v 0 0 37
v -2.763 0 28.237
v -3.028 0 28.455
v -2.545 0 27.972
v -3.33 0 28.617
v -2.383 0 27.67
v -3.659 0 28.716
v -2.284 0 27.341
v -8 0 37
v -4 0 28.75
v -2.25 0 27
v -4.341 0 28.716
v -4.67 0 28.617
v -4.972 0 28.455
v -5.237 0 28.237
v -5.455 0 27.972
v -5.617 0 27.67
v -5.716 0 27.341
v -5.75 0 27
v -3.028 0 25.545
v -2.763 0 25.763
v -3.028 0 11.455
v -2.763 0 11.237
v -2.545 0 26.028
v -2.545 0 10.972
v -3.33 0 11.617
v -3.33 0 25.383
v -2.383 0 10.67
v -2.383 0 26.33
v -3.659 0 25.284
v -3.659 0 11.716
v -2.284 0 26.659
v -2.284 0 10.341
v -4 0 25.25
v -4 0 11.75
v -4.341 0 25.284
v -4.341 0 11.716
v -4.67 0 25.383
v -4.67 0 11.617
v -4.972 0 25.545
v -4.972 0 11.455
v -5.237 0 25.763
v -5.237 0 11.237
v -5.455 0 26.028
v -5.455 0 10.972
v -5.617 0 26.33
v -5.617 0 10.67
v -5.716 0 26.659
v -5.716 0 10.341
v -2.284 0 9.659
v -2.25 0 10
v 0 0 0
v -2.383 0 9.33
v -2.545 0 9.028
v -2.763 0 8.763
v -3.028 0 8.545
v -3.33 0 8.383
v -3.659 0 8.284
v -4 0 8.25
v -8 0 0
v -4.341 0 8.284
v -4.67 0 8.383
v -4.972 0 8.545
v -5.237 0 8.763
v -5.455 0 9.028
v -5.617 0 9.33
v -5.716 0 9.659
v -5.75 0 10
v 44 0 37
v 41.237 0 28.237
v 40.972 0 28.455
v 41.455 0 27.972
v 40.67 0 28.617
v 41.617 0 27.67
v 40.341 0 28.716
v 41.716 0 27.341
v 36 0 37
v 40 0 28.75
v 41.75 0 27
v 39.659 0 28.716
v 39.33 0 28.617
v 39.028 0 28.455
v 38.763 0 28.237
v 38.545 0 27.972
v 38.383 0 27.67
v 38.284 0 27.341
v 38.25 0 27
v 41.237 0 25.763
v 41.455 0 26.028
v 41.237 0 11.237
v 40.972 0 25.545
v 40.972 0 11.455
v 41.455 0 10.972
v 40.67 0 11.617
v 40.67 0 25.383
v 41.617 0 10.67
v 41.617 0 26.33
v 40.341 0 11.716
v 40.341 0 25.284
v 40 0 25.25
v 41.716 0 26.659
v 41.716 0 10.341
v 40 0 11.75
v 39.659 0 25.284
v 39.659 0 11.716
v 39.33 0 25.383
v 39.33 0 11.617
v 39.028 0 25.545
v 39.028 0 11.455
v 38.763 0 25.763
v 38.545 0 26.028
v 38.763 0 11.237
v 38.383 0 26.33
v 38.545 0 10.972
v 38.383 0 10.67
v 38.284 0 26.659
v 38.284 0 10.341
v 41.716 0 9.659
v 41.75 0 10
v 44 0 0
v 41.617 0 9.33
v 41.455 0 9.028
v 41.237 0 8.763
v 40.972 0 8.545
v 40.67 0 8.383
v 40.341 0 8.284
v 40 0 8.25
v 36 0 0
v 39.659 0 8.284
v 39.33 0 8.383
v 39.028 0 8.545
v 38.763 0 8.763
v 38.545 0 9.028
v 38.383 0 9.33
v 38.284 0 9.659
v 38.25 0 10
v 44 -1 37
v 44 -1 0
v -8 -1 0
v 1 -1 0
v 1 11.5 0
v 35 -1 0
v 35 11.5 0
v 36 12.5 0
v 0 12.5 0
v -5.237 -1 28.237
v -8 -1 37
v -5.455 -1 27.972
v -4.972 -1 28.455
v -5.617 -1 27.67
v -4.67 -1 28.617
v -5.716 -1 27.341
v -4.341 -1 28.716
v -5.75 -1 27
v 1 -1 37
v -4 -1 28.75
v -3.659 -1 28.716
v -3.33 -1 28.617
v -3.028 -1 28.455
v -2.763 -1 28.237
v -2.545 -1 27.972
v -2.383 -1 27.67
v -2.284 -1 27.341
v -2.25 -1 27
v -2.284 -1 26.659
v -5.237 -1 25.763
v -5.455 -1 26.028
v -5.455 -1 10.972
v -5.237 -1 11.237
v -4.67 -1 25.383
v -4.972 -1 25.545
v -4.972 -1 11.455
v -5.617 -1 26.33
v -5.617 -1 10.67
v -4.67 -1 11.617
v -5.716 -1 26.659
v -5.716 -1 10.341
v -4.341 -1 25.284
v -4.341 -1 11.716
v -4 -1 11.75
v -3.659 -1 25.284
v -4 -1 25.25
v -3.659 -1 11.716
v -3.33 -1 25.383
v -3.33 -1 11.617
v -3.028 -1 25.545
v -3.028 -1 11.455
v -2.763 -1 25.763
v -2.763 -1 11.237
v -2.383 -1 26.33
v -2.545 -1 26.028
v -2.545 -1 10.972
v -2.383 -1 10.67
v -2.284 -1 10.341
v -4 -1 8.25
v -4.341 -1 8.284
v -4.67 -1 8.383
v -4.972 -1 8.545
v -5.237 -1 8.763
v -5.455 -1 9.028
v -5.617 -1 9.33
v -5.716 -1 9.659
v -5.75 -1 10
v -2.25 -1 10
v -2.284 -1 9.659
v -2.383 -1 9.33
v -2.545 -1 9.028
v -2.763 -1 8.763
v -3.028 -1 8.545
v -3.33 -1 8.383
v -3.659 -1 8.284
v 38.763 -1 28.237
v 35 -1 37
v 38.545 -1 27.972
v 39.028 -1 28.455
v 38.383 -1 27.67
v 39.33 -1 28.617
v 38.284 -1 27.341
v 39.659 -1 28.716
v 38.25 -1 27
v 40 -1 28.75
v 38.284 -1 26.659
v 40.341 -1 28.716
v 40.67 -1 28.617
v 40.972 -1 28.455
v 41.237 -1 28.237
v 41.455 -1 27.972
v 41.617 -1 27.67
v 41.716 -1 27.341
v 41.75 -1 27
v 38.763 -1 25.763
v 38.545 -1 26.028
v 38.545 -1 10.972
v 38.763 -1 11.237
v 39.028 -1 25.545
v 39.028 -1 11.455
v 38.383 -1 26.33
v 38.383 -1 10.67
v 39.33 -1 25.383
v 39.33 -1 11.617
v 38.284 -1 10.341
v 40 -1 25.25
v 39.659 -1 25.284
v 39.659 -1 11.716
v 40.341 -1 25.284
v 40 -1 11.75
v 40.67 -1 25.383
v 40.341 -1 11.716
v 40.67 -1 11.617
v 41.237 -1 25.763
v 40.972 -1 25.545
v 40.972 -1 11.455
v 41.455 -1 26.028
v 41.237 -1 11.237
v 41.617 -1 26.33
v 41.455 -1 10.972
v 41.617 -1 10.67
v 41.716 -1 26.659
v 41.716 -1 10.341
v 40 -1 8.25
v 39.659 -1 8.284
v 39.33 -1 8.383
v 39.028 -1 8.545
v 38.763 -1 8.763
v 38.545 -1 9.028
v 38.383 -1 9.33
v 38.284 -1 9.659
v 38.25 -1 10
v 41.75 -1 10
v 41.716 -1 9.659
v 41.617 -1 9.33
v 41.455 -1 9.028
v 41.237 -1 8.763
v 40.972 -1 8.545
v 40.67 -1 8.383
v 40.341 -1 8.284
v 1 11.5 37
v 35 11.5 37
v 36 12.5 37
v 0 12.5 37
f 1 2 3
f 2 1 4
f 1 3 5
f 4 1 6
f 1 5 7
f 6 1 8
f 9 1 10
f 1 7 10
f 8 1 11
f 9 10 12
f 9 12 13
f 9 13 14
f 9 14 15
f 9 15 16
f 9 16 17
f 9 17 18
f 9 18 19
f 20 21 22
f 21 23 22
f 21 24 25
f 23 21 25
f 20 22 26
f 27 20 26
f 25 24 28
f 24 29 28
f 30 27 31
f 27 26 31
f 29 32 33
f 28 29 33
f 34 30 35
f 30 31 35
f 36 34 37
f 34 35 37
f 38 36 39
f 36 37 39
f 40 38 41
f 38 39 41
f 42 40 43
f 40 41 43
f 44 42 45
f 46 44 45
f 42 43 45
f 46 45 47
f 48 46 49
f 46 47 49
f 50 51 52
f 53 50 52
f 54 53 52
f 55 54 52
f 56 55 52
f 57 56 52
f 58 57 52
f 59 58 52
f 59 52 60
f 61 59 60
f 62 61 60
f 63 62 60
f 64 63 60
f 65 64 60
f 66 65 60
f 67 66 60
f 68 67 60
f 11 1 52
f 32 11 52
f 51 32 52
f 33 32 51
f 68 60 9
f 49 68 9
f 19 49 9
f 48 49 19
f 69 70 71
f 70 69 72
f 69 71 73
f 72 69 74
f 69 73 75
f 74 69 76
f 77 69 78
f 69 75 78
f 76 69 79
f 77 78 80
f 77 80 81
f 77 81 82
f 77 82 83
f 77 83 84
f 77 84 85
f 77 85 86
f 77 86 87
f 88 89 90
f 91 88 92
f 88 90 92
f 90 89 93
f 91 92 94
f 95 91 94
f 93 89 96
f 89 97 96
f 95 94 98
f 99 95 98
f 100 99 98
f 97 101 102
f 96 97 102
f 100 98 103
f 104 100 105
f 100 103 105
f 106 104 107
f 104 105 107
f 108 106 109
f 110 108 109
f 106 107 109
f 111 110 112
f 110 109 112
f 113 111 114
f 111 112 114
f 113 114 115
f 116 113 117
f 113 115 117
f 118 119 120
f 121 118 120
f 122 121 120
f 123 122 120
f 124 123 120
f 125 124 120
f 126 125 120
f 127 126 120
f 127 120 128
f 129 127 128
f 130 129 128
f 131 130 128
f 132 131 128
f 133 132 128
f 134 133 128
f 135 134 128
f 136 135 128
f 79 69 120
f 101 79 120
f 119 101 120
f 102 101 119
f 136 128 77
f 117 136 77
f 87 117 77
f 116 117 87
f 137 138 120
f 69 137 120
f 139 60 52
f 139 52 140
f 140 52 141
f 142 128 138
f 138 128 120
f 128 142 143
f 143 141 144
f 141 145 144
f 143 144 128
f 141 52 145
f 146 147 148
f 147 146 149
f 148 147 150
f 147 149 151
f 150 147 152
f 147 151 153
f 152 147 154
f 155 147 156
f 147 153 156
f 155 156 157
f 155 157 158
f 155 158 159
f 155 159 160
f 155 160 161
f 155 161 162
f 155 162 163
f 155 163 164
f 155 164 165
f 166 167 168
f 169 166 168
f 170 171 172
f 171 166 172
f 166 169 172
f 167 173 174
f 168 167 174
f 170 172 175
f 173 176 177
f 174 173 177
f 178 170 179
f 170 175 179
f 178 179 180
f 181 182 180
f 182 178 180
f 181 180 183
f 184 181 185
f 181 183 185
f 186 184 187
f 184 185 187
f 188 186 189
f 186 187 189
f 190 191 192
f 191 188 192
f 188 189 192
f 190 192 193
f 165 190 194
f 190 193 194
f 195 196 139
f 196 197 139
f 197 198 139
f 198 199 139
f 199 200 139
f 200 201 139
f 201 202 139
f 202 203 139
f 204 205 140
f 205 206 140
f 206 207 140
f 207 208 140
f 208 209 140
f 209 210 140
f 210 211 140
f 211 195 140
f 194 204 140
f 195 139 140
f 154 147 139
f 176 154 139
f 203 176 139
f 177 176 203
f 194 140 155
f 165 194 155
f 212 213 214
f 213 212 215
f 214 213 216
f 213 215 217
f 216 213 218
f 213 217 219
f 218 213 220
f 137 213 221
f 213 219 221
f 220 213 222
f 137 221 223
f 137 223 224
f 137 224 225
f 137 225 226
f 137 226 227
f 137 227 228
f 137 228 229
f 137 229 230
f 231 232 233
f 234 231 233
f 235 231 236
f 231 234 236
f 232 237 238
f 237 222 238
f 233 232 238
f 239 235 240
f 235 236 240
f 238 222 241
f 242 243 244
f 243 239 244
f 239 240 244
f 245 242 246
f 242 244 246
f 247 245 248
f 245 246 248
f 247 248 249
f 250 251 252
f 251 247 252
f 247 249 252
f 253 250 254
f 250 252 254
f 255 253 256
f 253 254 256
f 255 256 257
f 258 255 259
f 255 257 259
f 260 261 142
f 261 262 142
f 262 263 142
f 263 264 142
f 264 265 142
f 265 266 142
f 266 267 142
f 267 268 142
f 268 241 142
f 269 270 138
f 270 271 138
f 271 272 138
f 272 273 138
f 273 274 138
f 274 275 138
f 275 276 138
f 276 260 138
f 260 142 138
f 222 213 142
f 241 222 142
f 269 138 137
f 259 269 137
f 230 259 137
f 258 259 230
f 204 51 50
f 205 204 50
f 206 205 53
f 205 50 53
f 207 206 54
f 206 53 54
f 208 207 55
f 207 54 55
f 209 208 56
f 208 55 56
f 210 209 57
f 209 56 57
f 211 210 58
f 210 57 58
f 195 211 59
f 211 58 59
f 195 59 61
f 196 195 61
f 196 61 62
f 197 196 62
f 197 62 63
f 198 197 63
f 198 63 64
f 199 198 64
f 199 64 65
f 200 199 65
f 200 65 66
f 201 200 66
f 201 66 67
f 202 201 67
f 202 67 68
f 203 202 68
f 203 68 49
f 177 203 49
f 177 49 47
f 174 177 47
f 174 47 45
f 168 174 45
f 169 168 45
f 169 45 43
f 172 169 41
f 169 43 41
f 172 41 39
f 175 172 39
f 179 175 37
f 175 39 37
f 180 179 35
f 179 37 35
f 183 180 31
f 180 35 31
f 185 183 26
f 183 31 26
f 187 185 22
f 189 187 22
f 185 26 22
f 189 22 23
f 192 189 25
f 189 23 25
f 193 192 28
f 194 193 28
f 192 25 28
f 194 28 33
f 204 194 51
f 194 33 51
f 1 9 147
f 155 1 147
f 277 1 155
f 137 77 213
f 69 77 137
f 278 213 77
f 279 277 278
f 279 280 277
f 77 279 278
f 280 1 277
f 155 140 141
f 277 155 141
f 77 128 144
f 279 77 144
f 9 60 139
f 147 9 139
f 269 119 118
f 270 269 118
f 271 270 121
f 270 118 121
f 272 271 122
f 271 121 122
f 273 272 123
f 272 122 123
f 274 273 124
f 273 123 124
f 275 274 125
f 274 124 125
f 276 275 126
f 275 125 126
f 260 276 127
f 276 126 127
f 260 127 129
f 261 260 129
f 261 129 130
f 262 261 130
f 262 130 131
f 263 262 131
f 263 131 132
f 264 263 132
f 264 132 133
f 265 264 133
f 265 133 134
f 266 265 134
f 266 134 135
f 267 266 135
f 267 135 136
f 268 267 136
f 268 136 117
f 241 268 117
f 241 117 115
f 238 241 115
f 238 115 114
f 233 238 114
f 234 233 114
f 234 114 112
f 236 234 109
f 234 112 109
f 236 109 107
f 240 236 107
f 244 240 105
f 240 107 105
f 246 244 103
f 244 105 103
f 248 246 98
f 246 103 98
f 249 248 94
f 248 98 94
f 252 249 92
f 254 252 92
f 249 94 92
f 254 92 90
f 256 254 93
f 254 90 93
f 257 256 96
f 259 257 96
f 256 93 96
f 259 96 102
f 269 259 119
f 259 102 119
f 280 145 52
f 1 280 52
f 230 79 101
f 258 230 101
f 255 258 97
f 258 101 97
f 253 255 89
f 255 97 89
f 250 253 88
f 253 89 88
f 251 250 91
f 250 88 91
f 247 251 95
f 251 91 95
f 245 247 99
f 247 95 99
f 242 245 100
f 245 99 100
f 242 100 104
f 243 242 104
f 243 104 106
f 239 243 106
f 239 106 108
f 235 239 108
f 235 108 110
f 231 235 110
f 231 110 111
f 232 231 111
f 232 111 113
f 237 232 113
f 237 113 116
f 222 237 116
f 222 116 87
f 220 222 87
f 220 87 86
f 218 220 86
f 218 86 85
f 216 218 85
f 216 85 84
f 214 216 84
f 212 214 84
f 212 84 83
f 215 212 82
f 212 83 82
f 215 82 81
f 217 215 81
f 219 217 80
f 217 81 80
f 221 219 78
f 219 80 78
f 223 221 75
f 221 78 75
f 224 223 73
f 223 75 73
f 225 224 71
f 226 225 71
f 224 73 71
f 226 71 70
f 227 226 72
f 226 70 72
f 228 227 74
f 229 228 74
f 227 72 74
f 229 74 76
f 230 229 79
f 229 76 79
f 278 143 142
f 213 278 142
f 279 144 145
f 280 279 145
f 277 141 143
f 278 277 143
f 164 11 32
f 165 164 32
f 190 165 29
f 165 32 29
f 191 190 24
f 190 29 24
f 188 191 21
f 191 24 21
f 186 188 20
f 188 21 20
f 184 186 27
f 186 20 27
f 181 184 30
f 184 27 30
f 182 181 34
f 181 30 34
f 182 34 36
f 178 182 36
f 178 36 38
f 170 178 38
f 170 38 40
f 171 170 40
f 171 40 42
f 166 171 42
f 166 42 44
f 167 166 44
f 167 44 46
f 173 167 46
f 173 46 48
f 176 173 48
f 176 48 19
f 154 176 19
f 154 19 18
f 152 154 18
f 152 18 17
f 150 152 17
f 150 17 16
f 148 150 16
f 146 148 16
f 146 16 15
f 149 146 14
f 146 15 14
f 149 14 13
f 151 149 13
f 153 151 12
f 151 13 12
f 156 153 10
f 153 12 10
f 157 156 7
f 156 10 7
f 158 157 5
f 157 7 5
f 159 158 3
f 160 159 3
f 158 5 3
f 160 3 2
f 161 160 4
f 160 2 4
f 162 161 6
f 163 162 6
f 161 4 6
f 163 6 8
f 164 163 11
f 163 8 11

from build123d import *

# Parameters (mm, degrees)
BOSS_EXTRUDE1_DEPTH = 37
SKETCH2_R           = 1.75
CUT_EXTRUDE1_DEPTH  = 6


with BuildPart() as part:
    # Sketch1 → Boss-Extrude1 (new body)
    with BuildSketch(Plane.XY):
        Polygon((1, 11.5), (35, 11.5), (35, -1), (44, -1), (44, 0), (36, 0), (36, 12.5), (0, 12.5), (0, 0), (-8, 0), (-8, -1), (1, -1), align=None)
    extrude(amount=BOSS_EXTRUDE1_DEPTH)

    # Sketch2 → Cut-Extrude1 (cut)
    with BuildSketch(Plane(origin=(0, 0, 0), x_dir=(1, 0, 0), z_dir=(0, 1, 0))):
        with Locations((-4, -27)):
            Circle(SKETCH2_R)
        with Locations((-4, -10)):
            Circle(SKETCH2_R)
        with Locations((40, -27)):
            Circle(SKETCH2_R)
        with Locations((40, -10)):
            Circle(SKETCH2_R)
    extrude(amount=-CUT_EXTRUDE1_DEPTH, mode=Mode.SUBTRACT)


solid = part.part
